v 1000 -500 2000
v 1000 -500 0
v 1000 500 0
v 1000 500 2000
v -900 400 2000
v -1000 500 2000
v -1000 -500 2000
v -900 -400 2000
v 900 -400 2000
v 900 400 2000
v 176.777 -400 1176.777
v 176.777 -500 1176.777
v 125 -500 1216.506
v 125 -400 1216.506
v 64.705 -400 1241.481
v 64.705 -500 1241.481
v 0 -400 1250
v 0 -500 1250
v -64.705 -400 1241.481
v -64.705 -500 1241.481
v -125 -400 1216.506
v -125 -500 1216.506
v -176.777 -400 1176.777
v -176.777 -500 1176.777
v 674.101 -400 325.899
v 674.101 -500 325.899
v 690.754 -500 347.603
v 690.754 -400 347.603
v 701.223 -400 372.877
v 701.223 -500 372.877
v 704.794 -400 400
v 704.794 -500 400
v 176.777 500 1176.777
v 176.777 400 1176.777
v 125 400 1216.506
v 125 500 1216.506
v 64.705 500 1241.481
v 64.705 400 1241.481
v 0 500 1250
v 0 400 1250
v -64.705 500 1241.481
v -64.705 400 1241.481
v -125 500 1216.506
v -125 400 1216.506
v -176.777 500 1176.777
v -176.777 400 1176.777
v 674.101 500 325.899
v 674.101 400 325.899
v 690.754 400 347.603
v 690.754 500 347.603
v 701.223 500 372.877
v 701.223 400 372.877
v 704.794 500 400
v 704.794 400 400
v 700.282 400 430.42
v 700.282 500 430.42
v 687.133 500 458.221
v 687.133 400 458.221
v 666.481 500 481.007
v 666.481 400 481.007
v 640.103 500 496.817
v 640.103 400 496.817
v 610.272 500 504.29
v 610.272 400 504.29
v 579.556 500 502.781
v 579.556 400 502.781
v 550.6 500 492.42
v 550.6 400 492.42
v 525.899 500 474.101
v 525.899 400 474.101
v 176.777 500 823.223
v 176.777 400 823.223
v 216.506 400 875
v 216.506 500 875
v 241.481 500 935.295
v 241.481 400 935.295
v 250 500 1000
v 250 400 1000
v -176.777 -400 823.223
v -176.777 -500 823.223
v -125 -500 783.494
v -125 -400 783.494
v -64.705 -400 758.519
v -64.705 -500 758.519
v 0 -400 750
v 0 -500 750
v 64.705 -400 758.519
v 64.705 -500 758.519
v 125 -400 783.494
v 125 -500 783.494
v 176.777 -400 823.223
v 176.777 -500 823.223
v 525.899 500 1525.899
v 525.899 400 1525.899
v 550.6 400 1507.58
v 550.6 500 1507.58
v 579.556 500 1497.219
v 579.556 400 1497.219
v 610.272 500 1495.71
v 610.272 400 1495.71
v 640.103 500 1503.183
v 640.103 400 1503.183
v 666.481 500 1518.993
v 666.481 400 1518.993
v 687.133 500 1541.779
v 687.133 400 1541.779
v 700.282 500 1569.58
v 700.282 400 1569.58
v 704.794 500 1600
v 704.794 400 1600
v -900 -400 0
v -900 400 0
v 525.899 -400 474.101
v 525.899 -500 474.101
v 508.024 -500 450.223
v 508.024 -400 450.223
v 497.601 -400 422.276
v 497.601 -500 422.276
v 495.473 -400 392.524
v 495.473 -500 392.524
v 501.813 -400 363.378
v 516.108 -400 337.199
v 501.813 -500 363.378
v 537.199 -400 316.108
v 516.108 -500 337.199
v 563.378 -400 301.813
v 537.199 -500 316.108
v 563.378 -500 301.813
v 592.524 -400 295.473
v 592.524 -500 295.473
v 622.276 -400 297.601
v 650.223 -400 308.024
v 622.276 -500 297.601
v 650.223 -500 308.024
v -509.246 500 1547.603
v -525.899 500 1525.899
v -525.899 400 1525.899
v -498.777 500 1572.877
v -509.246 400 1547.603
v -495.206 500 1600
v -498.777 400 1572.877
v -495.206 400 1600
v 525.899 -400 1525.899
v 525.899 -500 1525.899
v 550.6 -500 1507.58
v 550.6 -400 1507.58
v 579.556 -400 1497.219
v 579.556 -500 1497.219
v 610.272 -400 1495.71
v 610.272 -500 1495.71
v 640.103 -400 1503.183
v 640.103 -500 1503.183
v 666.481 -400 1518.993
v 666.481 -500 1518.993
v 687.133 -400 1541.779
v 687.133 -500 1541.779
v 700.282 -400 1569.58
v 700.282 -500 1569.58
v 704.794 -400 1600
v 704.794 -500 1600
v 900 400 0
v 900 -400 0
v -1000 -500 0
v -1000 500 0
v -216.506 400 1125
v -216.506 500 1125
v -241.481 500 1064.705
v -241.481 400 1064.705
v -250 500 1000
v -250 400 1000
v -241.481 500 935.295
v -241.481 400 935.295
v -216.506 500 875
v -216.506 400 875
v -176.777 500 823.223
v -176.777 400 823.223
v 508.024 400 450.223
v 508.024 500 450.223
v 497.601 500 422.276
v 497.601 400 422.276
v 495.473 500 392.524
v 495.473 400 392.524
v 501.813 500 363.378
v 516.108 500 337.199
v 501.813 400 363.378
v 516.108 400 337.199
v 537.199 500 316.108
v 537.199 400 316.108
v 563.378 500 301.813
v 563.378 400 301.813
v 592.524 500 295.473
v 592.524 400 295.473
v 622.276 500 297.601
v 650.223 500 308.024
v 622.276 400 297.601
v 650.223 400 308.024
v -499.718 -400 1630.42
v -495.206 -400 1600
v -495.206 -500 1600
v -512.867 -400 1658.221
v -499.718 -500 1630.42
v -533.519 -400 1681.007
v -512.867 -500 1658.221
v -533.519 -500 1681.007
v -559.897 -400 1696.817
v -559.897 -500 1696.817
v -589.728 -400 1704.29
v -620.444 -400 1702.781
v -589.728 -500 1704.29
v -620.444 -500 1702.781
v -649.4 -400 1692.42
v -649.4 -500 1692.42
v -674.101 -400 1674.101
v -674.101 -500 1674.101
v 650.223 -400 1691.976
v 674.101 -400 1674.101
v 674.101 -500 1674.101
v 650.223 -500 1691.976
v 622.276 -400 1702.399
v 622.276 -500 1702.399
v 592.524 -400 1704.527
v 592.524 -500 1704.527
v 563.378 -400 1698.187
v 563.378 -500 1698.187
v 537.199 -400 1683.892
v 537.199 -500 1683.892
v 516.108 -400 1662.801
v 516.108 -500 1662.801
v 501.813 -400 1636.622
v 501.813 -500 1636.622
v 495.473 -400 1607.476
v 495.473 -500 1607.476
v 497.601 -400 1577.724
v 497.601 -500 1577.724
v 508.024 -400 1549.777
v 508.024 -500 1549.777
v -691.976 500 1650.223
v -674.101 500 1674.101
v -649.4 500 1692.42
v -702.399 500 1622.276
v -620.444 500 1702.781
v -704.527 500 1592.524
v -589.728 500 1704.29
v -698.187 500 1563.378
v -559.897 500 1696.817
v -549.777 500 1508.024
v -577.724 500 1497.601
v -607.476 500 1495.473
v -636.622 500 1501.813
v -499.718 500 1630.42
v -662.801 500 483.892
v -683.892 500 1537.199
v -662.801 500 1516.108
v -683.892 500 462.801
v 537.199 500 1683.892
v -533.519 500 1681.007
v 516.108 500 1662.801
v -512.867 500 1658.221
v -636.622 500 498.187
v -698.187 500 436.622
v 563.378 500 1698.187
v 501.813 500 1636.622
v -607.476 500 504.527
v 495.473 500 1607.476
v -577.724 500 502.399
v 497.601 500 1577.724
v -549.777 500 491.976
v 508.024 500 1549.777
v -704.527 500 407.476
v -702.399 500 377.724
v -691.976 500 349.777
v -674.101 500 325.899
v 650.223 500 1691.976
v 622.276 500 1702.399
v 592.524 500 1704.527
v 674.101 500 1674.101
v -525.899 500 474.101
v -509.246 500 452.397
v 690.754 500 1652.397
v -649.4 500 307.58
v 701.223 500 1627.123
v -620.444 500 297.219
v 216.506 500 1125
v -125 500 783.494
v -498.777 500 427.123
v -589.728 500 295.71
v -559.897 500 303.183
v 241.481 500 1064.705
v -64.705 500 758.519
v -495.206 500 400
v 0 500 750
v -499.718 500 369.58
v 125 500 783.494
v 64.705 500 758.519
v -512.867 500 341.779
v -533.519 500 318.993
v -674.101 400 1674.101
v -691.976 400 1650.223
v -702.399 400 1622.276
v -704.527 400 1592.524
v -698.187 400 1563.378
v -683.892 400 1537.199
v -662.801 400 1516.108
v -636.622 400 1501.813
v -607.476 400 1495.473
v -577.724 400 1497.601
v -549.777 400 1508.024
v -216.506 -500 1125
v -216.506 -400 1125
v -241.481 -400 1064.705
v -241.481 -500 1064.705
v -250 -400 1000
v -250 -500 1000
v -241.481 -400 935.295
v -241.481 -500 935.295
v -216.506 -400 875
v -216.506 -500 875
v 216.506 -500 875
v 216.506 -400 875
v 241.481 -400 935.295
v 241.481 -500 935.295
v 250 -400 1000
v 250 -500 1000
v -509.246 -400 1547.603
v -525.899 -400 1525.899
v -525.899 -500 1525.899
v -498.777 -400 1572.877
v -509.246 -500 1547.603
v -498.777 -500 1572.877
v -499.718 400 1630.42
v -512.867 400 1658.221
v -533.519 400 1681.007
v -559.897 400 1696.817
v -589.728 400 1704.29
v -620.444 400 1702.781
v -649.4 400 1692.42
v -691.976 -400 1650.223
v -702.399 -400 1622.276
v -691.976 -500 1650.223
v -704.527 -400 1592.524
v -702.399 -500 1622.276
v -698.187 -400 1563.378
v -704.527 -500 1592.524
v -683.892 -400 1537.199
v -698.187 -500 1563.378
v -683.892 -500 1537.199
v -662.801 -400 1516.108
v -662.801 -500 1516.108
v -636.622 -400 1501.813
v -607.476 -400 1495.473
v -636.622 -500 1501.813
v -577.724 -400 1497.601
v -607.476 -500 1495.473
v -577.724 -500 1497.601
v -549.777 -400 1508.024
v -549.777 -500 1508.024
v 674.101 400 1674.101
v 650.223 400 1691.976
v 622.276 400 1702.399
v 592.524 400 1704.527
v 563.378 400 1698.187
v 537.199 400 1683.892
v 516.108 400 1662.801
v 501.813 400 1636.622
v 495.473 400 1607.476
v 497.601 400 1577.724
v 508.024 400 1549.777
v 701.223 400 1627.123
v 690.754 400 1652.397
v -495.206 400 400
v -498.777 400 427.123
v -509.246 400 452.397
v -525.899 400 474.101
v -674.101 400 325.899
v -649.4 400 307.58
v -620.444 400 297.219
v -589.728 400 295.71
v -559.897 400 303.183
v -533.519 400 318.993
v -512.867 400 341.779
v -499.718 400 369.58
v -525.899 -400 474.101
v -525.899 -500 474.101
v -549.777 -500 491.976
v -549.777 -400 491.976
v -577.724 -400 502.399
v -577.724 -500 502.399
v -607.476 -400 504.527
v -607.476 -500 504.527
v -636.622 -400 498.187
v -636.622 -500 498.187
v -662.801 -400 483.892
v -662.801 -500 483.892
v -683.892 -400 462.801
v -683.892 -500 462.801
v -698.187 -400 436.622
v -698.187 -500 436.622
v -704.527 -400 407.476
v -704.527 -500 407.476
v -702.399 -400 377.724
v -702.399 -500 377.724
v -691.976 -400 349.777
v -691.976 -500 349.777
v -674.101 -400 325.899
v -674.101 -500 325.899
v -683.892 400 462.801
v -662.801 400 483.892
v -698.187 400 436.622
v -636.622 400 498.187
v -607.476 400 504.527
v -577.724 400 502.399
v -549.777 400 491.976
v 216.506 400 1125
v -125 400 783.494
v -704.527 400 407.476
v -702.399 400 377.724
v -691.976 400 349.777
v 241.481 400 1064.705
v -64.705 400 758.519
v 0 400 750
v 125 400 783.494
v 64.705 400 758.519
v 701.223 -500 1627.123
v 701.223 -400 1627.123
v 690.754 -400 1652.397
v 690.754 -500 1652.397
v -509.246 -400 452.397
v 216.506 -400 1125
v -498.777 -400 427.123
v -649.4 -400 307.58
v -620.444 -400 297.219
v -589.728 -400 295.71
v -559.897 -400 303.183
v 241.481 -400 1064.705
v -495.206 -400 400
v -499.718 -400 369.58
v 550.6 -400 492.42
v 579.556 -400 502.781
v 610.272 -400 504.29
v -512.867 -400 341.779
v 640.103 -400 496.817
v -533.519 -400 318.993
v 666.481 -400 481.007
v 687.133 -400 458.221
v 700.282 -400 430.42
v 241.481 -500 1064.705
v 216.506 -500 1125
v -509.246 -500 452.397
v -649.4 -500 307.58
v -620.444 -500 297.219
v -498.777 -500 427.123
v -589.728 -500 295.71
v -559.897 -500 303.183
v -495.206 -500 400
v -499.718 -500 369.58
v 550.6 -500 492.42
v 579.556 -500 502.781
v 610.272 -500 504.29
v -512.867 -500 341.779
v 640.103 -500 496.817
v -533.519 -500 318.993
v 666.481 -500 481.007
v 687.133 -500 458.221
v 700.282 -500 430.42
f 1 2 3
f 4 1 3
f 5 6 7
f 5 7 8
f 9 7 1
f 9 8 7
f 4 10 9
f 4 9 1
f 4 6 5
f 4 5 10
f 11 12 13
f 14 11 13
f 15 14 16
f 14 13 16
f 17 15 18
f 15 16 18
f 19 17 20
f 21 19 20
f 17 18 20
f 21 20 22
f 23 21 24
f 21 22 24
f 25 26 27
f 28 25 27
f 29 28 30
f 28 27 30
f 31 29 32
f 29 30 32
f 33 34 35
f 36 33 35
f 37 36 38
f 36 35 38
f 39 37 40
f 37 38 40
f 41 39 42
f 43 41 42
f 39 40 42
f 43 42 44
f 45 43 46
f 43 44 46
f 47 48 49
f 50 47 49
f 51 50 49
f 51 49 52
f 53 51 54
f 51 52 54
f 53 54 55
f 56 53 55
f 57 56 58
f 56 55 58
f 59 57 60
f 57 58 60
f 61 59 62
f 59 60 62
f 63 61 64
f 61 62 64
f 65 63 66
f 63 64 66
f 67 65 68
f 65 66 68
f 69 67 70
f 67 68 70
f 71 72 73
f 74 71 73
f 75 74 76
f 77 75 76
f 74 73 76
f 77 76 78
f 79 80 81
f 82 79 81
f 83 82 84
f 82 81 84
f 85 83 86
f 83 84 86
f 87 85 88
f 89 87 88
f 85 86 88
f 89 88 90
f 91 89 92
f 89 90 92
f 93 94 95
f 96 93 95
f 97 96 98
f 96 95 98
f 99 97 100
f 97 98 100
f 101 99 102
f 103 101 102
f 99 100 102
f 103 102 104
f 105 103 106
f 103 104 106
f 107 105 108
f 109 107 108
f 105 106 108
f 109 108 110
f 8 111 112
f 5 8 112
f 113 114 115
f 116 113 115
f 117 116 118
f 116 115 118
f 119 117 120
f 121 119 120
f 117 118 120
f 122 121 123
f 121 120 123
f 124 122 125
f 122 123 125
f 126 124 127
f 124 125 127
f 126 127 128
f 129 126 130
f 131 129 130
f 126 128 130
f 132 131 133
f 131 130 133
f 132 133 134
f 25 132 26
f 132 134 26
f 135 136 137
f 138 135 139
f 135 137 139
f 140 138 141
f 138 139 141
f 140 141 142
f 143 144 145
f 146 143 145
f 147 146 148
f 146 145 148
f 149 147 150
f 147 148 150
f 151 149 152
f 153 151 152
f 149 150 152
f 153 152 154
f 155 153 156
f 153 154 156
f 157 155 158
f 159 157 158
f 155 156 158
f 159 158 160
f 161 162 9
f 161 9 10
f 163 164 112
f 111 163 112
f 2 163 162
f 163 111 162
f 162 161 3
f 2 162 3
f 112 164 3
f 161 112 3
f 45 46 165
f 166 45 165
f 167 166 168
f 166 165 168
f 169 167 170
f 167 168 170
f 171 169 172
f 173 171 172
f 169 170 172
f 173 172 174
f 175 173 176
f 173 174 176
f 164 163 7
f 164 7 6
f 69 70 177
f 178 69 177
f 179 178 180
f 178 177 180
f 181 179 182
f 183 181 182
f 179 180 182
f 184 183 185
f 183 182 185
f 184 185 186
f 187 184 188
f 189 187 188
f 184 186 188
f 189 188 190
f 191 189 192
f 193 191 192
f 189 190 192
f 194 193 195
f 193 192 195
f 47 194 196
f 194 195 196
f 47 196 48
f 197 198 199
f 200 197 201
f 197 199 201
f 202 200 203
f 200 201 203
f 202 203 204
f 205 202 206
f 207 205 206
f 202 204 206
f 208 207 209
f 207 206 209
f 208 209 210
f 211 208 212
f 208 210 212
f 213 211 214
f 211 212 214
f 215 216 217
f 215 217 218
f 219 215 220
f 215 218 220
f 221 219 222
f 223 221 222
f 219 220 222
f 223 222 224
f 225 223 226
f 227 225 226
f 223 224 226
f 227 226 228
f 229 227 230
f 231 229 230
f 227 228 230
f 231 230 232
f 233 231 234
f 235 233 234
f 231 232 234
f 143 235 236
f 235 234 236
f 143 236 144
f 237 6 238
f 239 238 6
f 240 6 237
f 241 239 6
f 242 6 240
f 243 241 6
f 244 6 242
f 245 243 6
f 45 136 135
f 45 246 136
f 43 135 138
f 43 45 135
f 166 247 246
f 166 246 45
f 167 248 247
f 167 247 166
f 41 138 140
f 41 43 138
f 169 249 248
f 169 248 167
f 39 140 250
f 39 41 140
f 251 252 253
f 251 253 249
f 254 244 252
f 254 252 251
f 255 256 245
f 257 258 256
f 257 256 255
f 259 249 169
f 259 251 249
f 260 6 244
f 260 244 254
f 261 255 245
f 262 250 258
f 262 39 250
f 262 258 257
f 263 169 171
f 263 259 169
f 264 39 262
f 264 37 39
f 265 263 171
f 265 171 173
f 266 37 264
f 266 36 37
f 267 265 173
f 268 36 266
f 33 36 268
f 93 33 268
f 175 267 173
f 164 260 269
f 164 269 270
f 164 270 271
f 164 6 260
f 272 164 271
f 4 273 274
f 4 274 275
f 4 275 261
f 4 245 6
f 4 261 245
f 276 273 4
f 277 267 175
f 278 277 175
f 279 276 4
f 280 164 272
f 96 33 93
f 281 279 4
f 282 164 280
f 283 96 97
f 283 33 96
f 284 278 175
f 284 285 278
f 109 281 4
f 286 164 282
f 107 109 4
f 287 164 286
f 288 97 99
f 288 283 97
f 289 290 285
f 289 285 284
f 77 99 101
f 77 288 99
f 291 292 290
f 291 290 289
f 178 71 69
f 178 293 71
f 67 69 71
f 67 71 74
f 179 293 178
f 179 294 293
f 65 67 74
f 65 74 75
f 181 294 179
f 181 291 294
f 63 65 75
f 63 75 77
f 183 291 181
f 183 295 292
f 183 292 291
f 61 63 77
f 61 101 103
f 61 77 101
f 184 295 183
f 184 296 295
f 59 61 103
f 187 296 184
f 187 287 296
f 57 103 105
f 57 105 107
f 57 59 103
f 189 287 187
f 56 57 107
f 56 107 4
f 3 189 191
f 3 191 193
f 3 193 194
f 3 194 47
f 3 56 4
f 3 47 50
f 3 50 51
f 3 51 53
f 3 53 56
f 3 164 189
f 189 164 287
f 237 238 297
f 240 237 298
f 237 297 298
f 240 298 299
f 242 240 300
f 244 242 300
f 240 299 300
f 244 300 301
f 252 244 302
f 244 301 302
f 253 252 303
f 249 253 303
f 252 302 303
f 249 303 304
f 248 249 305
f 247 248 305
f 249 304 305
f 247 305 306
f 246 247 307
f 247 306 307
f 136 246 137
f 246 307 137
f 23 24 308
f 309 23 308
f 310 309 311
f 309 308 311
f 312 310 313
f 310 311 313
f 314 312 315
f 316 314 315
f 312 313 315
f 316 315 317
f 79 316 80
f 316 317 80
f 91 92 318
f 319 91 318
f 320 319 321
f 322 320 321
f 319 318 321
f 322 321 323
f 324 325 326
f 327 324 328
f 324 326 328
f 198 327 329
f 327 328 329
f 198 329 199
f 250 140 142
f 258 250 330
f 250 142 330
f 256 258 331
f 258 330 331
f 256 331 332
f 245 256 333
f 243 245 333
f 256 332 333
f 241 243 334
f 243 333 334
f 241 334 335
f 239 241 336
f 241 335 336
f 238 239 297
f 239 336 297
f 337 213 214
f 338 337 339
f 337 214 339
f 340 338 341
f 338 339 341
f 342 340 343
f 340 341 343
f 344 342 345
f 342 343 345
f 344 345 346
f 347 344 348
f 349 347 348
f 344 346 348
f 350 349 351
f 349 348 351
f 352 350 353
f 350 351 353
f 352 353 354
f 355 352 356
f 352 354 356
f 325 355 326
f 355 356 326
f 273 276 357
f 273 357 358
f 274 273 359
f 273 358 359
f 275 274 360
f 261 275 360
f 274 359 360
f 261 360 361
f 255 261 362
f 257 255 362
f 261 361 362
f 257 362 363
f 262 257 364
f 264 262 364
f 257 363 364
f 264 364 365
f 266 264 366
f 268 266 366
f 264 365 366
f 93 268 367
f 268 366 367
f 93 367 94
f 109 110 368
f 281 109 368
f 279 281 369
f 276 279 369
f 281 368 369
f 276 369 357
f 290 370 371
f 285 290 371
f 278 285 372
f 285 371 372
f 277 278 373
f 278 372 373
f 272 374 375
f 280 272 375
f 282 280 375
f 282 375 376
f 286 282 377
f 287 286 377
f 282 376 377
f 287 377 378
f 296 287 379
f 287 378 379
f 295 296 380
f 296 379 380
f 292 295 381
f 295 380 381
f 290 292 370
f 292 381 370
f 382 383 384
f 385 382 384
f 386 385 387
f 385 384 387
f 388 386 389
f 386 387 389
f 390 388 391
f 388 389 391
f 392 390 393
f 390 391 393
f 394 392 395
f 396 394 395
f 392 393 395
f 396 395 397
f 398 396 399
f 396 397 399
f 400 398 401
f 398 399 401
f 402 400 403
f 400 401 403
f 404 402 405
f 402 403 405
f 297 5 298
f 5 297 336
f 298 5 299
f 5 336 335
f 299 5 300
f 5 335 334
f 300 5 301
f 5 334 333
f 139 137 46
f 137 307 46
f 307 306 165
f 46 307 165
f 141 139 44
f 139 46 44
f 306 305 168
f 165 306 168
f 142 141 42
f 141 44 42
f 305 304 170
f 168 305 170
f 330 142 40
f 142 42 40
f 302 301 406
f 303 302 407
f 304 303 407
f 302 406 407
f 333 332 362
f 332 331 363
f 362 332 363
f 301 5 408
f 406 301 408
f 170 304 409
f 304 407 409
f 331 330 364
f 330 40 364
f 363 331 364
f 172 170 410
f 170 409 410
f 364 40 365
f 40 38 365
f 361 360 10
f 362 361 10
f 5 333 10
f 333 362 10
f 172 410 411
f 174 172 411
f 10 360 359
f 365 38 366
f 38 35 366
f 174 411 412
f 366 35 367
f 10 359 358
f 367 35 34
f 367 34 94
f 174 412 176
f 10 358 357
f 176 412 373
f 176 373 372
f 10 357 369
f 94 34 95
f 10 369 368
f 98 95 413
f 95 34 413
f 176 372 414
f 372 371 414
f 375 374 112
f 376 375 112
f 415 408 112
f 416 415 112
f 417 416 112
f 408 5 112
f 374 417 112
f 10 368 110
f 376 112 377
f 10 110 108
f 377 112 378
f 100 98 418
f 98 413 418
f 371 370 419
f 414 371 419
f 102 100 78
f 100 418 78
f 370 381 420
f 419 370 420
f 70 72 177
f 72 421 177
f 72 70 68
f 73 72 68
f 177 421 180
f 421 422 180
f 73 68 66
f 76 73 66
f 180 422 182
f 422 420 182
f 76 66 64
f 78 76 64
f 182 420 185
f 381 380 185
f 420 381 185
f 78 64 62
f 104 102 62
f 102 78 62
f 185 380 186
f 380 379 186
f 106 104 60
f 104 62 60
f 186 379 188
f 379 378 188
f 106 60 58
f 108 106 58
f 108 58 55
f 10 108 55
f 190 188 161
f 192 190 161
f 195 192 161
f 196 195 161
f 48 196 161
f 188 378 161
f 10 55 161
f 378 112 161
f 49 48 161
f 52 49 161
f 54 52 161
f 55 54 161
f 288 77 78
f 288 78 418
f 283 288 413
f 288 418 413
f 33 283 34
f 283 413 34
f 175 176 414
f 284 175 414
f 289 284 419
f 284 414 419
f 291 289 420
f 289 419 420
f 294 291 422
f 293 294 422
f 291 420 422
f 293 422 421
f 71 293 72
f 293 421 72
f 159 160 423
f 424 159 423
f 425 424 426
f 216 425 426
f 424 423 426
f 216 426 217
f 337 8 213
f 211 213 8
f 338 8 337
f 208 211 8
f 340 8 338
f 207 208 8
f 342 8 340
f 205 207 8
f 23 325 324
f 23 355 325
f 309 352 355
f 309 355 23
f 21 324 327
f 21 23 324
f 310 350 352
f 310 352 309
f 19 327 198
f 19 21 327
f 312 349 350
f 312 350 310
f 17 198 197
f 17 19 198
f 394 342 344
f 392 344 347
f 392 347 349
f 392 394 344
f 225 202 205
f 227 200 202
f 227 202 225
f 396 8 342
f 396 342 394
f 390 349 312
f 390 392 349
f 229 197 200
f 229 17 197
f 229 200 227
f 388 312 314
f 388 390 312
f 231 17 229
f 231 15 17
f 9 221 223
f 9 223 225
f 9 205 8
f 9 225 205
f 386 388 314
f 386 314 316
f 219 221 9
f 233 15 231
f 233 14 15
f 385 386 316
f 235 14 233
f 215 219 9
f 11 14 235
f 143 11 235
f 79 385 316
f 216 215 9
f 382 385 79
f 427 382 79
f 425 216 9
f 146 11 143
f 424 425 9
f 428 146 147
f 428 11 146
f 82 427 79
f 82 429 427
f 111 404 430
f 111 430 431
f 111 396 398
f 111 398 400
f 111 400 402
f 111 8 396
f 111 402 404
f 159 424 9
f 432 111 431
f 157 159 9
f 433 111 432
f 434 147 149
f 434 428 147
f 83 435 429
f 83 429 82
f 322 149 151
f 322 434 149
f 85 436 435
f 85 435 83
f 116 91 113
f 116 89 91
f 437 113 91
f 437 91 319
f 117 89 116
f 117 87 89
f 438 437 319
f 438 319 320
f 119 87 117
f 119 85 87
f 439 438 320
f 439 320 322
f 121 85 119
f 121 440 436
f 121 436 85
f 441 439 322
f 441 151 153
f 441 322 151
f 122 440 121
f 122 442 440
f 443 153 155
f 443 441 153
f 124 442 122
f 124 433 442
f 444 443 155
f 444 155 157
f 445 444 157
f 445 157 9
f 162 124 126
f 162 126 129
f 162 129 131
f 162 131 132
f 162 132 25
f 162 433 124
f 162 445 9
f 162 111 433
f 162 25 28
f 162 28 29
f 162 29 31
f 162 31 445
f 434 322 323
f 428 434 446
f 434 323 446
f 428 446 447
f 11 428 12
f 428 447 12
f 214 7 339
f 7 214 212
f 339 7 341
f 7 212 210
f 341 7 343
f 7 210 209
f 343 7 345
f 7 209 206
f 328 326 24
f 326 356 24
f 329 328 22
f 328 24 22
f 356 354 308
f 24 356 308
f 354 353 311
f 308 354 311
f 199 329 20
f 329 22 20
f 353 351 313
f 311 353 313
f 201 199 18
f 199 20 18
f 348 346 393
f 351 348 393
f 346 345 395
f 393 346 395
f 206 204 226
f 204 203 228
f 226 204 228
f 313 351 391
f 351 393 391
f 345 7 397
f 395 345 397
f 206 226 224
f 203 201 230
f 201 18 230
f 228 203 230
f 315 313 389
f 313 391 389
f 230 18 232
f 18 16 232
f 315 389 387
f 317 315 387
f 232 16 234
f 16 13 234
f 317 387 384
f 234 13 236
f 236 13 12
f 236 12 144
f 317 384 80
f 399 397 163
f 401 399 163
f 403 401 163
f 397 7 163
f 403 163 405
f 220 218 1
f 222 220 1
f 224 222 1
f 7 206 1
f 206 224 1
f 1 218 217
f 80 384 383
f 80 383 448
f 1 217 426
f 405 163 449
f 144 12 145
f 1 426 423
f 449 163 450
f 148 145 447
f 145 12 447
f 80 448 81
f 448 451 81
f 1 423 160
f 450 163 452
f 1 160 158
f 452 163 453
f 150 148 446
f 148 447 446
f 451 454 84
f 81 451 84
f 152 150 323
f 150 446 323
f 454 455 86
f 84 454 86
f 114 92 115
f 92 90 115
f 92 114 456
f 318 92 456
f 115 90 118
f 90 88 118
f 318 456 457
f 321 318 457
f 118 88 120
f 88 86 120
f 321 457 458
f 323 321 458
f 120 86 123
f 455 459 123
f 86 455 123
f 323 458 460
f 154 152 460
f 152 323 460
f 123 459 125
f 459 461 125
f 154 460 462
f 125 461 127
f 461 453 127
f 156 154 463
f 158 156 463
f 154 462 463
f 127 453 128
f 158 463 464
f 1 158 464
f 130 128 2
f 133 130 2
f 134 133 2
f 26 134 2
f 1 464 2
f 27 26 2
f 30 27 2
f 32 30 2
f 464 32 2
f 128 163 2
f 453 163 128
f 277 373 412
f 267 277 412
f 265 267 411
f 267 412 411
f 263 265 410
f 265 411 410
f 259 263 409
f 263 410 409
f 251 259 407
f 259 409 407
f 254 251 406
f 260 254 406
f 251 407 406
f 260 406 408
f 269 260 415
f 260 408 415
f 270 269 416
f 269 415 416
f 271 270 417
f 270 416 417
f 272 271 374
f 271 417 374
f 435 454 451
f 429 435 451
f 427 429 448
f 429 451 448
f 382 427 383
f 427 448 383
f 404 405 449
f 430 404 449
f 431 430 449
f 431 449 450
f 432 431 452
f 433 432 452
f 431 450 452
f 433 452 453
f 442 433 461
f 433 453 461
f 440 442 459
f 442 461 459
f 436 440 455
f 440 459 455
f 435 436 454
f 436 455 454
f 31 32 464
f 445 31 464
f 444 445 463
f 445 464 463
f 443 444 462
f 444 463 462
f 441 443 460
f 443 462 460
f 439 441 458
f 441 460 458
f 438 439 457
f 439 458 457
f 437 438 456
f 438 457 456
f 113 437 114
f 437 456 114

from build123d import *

# Parameters (mm, degrees)
F0_W     = 2000
F0_H     = 1000
F0_W_2   = 1800
F0_H_2   = 800
F1_DEPTH = 2000
F3_DEPTH = 2225.647926
F4_DEPTH = 1010.152698


with BuildPart() as f1:
    # F0 (on Top) → F1 (new body)
    with BuildSketch(Plane.XY):
        Rectangle(F0_W, F0_H)
        Rectangle(F0_W_2, F0_H_2, mode=Mode.SUBTRACT)
    extrude(amount=F1_DEPTH)

    # F2 (on face) → F3 (cut)
    with BuildSketch(Plane.XZ.offset(500)):
        with BuildLine():
            ThreePointArc((-495.205782, 1600.000029), (-559.896999, 1696.817267), (-674.100717, 1674.100717))
            Line((-674.100717, 1674.100717), (-525.899312, 1525.899312))
            ThreePointArc((-525.899312, 1525.899312), (-503.182771, 1559.897009), (-495.205782, 1600.000029))
        make_face()
        with BuildLine():
            ThreePointArc((674.100702, 1674.100702), (525.899298, 1674.100702), (525.899298, 1525.899298))
            Line((525.899298, 1525.899298), (674.100702, 1674.100702))
        make_face()
        with BuildLine():
            Line((674.100702, 1674.100702), (525.899298, 1525.899298))
            ThreePointArc((525.899298, 1525.899298), (640.103011, 1503.182767), (704.794218, 1600))
            ThreePointArc((704.794218, 1600), (696.817233, 1640.103011), (674.100702, 1674.100702))
        make_face()
        with BuildLine():
            ThreePointArc((704.794218, 400), (640.103011, 496.817233), (525.899298, 474.100702))
            Line((525.899298, 474.100702), (674.100702, 325.899298))
            ThreePointArc((674.100702, 325.899298), (696.817233, 359.896989), (704.794218, 400))
        make_face()
        with BuildLine():
            Line((674.100702, 325.899298), (525.899298, 474.100702))
            ThreePointArc((525.899298, 474.100702), (525.899298, 325.899298), (674.100702, 325.899298))
        make_face()
        with BuildLine():
            ThreePointArc((-495.205782, 400.000029), (-503.182763, 440.103031), (-525.899283, 474.100717))
            Line((-525.899283, 474.100717), (-674.100688, 325.899312))
            ThreePointArc((-674.100688, 325.899312), (-559.896979, 303.1828), (-495.205782, 400.000029))
        make_face()
        with BuildLine():
            Line((-674.100688, 325.899312), (-525.899283, 474.100717))
            ThreePointArc((-525.899283, 474.100717), (-674.100702, 474.100732), (-674.100688, 325.899312))
        make_face()
        with BuildLine():
            ThreePointArc((176.776695, 1176.776695), (0, 1250), (-176.776695, 1176.776695))
            Line((-176.776695, 1176.776695), (0, 1000))
            Line((0, 1000), (176.776695, 1176.776695))
        make_face()
        with BuildLine():
            Line((0, 1000), (-176.776695, 1176.776695))
            ThreePointArc((-176.776695, 1176.776695), (-250, 1000), (-176.776695, 823.223305))
            Line((-176.776695, 823.223305), (0, 1000))
        make_face()
        with BuildLine():
            Line((-525.899312, 1525.899312), (-674.100717, 1674.100717))
            ThreePointArc((-674.100717, 1674.100717), (-674.100702, 1525.899327), (-525.899312, 1525.899312))
        make_face()
        with BuildLine():
            Line((176.776695, 1176.776695), (0, 1000))
            Line((0, 1000), (176.776695, 823.223305))
            ThreePointArc((176.776695, 823.223305), (230.969883, 904.329142), (250, 1000))
            ThreePointArc((250, 1000), (230.969883, 1095.670858), (176.776695, 1176.776695))
        make_face()
        with BuildLine():
            Line((176.776695, 823.223305), (0, 1000))
            Line((0, 1000), (-176.776695, 823.223305))
            ThreePointArc((-176.776695, 823.223305), (0, 750), (176.776695, 823.223305))
        make_face()
    extrude(amount=-F3_DEPTH, mode=Mode.SUBTRACT)

    # F2 (on face) → F4 (cut)
    with BuildSketch(Plane.XZ.offset(500)):
        with BuildLine():
            ThreePointArc((-495.205782, 1600.000029), (-559.896999, 1696.817267), (-674.100717, 1674.100717))
            Line((-674.100717, 1674.100717), (-525.899312, 1525.899312))
            ThreePointArc((-525.899312, 1525.899312), (-503.182771, 1559.897009), (-495.205782, 1600.000029))
        make_face()
        with BuildLine():
            ThreePointArc((674.100702, 1674.100702), (525.899298, 1674.100702), (525.899298, 1525.899298))
            Line((525.899298, 1525.899298), (674.100702, 1674.100702))
        make_face()
        with BuildLine():
            Line((674.100702, 1674.100702), (525.899298, 1525.899298))
            ThreePointArc((525.899298, 1525.899298), (640.103011, 1503.182767), (704.794218, 1600))
            ThreePointArc((704.794218, 1600), (696.817233, 1640.103011), (674.100702, 1674.100702))
        make_face()
        with BuildLine():
            ThreePointArc((704.794218, 400), (640.103011, 496.817233), (525.899298, 474.100702))
            Line((525.899298, 474.100702), (674.100702, 325.899298))
            ThreePointArc((674.100702, 325.899298), (696.817233, 359.896989), (704.794218, 400))
        make_face()
        with BuildLine():
            Line((674.100702, 325.899298), (525.899298, 474.100702))
            ThreePointArc((525.899298, 474.100702), (525.899298, 325.899298), (674.100702, 325.899298))
        make_face()
        with BuildLine():
            ThreePointArc((-495.205782, 400.000029), (-503.182763, 440.103031), (-525.899283, 474.100717))
            Line((-525.899283, 474.100717), (-674.100688, 325.899312))
            ThreePointArc((-674.100688, 325.899312), (-559.896979, 303.1828), (-495.205782, 400.000029))
        make_face()
        with BuildLine():
            Line((-674.100688, 325.899312), (-525.899283, 474.100717))
            ThreePointArc((-525.899283, 474.100717), (-674.100702, 474.100732), (-674.100688, 325.899312))
        make_face()
        with BuildLine():
            ThreePointArc((176.776695, 1176.776695), (0, 1250), (-176.776695, 1176.776695))
            Line((-176.776695, 1176.776695), (0, 1000))
            Line((0, 1000), (176.776695, 1176.776695))
        make_face()
        with BuildLine():
            Line((0, 1000), (-176.776695, 1176.776695))
            ThreePointArc((-176.776695, 1176.776695), (-250, 1000), (-176.776695, 823.223305))
            Line((-176.776695, 823.223305), (0, 1000))
        make_face()
        with BuildLine():
            Line((-525.899312, 1525.899312), (-674.100717, 1674.100717))
            ThreePointArc((-674.100717, 1674.100717), (-674.100702, 1525.899327), (-525.899312, 1525.899312))
        make_face()
        with BuildLine():
            Line((176.776695, 1176.776695), (0, 1000))
            Line((0, 1000), (176.776695, 823.223305))
            ThreePointArc((176.776695, 823.223305), (230.969883, 904.329142), (250, 1000))
            ThreePointArc((250, 1000), (230.969883, 1095.670858), (176.776695, 1176.776695))
        make_face()
        with BuildLine():
            Line((176.776695, 823.223305), (0, 1000))
            Line((0, 1000), (-176.776695, 823.223305))
            ThreePointArc((-176.776695, 823.223305), (0, 750), (176.776695, 823.223305))
        make_face()
    extrude(amount=-F4_DEPTH, mode=Mode.SUBTRACT)


solid = f1.part
